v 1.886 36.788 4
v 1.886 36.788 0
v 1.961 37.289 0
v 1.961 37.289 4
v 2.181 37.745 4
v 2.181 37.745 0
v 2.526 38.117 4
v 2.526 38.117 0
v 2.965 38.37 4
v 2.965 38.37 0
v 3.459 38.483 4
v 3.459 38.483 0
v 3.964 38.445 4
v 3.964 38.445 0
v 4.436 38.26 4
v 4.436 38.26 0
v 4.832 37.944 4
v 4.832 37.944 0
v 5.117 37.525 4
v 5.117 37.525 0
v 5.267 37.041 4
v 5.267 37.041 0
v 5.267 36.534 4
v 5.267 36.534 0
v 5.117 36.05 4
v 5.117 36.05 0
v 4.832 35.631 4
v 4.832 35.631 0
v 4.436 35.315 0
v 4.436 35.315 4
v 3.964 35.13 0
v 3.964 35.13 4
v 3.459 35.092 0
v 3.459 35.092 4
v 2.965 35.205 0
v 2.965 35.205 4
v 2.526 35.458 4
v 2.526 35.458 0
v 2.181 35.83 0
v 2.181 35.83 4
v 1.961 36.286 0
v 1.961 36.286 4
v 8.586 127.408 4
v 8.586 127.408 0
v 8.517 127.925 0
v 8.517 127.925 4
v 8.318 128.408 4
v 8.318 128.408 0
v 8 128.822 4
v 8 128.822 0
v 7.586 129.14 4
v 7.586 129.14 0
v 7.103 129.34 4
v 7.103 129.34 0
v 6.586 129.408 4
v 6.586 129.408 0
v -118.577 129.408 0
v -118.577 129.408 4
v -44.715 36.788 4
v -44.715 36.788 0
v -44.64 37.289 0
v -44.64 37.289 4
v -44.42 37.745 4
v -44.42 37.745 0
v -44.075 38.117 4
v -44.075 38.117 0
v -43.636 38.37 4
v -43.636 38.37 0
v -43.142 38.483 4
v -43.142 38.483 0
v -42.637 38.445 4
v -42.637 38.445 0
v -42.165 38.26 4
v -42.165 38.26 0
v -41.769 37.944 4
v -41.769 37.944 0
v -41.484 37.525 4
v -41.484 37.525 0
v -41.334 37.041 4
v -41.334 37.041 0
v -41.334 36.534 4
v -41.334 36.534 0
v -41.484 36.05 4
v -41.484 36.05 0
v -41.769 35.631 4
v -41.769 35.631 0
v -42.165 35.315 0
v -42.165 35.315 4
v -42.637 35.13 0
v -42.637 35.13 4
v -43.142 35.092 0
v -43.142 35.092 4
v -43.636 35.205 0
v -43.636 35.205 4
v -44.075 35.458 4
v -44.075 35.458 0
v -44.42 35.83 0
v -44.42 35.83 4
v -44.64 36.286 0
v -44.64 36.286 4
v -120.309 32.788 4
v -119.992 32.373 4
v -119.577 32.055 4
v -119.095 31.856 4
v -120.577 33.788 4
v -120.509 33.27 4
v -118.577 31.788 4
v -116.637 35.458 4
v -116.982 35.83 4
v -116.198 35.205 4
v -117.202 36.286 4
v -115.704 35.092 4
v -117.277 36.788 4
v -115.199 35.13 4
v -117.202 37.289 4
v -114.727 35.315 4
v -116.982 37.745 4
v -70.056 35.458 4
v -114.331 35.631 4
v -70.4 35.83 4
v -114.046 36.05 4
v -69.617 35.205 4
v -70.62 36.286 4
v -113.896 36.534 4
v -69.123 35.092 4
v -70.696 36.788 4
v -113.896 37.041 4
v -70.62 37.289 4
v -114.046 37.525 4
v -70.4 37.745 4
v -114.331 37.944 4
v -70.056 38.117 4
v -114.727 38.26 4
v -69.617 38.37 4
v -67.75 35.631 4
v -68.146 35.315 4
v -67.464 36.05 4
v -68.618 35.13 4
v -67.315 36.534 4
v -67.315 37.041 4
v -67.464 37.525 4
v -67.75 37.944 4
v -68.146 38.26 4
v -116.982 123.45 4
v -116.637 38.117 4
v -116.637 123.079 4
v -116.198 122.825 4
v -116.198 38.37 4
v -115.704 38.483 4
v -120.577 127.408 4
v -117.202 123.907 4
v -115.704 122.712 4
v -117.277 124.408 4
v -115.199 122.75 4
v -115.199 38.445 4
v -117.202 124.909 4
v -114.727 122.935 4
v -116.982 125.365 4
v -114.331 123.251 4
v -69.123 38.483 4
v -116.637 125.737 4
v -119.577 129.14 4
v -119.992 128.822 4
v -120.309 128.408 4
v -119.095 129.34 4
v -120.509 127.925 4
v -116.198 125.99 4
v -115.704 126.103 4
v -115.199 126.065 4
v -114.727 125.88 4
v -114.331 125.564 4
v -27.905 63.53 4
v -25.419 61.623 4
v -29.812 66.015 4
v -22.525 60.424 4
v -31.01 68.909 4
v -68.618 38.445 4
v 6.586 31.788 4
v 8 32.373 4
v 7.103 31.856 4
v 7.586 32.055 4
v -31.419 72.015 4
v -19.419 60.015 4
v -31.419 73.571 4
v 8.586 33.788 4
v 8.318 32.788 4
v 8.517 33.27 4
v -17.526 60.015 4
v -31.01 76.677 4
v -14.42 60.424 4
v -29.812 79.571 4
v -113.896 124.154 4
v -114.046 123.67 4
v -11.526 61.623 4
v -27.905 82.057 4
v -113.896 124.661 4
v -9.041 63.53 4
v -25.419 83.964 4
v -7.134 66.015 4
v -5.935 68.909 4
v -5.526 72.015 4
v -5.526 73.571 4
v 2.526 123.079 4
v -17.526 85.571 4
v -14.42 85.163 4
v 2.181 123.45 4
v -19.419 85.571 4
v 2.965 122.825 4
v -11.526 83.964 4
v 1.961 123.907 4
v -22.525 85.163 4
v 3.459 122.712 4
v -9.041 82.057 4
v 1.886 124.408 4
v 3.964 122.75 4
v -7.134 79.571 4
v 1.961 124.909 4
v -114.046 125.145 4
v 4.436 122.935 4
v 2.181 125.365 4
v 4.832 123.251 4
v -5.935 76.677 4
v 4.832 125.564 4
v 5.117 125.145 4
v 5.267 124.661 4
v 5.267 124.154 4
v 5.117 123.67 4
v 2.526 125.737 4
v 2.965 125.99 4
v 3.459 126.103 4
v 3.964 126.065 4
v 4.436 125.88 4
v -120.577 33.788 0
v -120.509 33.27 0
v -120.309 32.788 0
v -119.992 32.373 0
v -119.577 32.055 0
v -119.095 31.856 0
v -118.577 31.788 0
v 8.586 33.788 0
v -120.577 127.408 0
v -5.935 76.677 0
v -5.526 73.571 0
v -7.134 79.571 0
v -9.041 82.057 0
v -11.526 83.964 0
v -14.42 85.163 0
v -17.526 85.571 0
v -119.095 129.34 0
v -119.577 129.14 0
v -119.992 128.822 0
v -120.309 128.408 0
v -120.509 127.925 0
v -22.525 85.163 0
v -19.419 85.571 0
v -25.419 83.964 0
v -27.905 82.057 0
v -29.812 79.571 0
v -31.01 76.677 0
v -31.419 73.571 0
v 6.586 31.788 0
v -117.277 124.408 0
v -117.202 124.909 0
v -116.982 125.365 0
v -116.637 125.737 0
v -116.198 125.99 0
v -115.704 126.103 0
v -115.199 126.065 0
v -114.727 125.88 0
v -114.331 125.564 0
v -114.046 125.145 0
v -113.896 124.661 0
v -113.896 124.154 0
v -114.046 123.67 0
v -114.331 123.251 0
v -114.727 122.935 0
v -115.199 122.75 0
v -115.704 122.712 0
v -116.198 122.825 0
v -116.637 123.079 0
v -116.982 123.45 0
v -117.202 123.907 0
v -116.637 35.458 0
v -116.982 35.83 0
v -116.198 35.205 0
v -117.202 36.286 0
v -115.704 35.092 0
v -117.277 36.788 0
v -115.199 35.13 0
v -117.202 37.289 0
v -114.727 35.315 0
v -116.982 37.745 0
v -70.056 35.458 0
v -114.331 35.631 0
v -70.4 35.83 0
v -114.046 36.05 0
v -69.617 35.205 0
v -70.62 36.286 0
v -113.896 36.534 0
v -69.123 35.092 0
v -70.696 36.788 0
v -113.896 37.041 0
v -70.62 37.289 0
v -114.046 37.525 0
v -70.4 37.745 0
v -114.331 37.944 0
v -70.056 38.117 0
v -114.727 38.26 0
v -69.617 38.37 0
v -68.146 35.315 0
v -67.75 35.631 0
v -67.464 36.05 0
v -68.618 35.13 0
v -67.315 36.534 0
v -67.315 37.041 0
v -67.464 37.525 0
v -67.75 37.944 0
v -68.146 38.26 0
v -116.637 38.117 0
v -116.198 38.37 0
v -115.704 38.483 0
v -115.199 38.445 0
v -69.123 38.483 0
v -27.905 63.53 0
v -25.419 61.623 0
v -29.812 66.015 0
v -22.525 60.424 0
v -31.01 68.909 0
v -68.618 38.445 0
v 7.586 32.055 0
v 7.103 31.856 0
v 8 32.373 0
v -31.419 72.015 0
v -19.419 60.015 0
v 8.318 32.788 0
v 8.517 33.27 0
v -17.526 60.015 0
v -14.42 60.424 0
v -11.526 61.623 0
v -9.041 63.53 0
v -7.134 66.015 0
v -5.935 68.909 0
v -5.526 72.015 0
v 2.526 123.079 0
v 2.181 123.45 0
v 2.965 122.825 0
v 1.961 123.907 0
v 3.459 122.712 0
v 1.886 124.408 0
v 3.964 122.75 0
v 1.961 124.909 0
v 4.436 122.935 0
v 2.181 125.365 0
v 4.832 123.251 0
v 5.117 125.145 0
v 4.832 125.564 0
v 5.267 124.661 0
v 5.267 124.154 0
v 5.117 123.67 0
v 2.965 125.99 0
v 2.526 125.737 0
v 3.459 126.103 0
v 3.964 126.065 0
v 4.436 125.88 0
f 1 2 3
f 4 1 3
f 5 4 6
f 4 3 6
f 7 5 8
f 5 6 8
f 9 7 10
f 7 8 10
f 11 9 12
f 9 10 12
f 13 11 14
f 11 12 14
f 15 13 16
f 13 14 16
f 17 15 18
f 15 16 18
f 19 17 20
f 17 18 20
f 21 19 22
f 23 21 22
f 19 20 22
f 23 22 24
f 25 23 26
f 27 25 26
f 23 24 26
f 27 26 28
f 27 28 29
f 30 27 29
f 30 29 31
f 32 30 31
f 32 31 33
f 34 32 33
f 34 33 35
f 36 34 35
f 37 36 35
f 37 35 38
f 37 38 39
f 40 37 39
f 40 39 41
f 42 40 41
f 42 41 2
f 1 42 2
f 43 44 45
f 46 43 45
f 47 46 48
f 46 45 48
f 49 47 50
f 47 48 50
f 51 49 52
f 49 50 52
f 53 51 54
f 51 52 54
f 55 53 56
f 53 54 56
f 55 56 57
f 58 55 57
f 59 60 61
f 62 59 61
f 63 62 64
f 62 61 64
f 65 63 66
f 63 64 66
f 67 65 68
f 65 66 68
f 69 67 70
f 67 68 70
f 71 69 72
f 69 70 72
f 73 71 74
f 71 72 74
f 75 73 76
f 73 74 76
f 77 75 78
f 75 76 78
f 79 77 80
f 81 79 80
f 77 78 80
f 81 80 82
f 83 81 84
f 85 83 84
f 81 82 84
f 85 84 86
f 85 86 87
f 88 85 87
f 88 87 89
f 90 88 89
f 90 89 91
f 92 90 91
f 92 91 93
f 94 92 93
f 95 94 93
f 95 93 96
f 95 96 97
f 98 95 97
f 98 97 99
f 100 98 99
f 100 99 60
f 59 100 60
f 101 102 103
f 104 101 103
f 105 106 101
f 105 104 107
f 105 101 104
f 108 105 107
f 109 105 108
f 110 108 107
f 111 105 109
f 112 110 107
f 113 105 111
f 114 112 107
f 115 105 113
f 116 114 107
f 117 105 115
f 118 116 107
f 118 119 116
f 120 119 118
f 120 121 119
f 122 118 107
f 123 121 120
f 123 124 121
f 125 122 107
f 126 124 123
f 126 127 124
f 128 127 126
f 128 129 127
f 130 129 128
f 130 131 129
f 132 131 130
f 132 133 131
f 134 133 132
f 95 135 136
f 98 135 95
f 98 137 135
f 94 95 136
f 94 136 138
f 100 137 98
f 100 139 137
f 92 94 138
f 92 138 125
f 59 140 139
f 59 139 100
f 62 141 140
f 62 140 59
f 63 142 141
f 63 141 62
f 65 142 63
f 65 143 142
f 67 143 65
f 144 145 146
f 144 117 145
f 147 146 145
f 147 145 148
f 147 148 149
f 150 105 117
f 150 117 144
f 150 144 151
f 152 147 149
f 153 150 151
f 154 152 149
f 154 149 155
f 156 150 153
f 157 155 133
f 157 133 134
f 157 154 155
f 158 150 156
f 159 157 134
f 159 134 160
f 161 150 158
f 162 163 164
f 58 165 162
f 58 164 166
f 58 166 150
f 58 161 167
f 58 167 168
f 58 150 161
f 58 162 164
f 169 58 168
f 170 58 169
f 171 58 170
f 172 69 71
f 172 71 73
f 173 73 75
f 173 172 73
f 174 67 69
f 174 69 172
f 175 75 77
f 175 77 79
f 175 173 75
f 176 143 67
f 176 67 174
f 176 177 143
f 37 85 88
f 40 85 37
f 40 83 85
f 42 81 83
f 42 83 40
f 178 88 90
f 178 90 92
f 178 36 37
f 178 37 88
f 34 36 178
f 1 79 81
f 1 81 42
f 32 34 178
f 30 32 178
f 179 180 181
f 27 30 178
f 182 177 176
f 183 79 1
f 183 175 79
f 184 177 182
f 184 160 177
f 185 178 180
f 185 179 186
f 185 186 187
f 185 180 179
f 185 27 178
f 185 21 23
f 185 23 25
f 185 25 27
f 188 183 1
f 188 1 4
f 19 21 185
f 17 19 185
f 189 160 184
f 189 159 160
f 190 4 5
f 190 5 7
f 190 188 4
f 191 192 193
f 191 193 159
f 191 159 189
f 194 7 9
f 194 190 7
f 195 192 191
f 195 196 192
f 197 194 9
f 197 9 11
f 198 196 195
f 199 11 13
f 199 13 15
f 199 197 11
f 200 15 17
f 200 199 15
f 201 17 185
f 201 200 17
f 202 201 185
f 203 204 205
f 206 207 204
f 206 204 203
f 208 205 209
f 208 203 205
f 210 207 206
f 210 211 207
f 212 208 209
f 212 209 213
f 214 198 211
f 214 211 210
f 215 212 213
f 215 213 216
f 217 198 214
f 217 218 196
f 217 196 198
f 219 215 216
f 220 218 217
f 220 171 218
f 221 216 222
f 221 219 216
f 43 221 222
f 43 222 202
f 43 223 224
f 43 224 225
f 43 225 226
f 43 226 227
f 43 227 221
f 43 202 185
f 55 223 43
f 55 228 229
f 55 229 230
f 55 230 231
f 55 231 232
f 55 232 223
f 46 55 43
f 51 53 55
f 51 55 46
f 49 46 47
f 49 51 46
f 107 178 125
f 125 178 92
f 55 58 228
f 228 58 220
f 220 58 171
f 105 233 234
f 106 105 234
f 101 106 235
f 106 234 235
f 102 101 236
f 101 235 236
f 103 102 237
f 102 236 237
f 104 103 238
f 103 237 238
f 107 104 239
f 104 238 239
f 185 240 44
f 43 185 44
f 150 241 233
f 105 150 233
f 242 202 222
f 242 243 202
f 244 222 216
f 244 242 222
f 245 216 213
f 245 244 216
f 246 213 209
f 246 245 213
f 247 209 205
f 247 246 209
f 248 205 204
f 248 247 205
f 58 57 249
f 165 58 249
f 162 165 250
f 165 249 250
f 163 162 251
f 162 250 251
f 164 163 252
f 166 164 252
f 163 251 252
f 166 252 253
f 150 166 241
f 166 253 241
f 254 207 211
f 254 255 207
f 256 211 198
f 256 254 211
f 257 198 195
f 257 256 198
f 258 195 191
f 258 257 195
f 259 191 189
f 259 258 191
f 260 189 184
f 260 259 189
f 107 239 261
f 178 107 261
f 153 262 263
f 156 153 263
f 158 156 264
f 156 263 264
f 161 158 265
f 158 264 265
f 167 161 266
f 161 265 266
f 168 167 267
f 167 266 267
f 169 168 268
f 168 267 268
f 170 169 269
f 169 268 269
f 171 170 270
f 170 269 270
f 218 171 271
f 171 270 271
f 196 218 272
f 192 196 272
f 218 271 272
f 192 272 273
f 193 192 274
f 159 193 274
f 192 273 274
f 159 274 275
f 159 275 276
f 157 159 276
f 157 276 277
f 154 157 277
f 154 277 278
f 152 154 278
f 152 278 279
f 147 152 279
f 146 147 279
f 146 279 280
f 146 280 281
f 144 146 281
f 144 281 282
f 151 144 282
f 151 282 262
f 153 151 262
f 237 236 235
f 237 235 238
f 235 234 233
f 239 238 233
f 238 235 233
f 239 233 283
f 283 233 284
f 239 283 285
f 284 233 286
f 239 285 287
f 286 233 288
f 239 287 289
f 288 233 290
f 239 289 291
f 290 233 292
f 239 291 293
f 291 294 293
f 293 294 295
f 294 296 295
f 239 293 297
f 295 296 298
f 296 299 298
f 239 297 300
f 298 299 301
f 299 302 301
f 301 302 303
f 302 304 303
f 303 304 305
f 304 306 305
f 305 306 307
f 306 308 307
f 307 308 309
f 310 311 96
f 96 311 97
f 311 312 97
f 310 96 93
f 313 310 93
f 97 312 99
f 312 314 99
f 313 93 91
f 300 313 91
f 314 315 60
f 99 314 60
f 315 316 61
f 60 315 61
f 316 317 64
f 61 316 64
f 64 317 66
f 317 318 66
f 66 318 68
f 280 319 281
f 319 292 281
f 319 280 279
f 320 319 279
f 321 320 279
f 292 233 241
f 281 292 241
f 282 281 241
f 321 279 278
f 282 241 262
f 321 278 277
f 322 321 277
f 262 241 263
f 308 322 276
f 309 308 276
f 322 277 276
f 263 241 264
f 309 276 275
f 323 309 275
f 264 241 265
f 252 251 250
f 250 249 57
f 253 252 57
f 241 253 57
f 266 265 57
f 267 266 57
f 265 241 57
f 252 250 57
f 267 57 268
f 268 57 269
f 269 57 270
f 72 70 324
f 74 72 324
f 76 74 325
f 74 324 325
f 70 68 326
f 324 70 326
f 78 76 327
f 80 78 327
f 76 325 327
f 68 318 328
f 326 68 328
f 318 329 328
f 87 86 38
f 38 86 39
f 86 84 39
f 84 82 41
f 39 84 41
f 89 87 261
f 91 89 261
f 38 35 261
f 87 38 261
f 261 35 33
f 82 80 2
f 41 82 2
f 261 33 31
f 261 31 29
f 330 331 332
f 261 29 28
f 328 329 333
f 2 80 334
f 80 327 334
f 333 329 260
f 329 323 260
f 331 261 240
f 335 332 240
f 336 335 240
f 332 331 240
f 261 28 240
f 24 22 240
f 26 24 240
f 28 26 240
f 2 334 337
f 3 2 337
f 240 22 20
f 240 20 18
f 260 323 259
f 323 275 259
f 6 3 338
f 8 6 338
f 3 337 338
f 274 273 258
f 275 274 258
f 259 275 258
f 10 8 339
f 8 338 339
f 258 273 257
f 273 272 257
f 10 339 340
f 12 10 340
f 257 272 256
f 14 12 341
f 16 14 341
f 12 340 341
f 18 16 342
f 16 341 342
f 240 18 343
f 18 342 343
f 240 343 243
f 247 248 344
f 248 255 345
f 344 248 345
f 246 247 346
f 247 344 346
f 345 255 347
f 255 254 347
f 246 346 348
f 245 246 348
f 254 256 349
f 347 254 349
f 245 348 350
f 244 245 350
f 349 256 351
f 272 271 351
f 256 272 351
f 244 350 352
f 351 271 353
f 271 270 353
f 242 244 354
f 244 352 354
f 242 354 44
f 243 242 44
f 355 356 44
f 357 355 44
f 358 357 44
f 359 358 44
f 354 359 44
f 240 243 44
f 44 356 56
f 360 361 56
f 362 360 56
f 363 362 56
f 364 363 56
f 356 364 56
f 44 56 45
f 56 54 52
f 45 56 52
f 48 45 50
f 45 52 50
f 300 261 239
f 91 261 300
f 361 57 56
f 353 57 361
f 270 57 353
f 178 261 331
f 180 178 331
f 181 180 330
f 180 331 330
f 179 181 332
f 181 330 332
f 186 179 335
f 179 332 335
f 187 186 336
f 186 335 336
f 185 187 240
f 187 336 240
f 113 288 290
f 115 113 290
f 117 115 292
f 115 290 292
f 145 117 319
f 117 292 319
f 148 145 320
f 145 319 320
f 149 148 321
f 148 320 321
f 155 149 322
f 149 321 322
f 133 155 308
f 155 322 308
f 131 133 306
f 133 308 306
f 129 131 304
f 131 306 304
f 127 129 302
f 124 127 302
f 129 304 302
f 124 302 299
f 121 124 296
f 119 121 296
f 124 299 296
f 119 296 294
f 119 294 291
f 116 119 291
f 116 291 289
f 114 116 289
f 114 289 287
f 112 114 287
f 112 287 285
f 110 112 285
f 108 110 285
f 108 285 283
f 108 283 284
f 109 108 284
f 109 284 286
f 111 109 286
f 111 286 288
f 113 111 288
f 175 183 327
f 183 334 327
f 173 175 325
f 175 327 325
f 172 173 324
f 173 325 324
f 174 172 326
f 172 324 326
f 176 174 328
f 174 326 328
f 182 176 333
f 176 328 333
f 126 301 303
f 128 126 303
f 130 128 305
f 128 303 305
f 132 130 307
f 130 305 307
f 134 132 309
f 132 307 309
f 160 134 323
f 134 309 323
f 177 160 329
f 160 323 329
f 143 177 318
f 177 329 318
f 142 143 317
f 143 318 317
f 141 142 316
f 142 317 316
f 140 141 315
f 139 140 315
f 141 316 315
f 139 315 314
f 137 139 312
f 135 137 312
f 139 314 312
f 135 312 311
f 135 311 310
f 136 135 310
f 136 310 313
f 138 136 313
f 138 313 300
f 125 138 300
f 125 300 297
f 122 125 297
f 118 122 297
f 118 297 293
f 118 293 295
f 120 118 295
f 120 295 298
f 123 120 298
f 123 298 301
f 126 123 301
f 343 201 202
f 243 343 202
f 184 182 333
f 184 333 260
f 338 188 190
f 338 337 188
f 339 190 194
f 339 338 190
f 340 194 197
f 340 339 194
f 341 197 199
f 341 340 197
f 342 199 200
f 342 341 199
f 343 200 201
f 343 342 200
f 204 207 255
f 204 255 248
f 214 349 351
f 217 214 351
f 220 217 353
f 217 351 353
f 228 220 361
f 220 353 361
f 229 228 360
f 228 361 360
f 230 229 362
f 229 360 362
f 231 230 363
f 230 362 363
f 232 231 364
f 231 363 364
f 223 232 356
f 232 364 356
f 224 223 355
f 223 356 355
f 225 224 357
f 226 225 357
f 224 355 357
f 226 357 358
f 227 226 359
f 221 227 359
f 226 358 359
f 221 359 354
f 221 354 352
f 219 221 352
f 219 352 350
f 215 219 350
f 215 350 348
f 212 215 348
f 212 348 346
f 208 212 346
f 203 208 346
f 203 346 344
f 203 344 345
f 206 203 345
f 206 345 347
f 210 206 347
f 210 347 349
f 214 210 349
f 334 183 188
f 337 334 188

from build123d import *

# Parameters (mm, degrees)
BOSS_EXTRUDE1_DEPTH  = 4
M3_CLEARANCE_HOLE1_D = 3.4
SKETCH4_W            = 25.893128439
SKETCH4_H            = 25.556513708
CUT_EXTRUDE1_DEPTH   = 8
FILLET1_R            = 12


with BuildPart() as part:
    # Sketch1 → Boss-Extrude1 (new body)
    with BuildSketch(Plane.XY):
        with BuildLine():
            Line((-118.577385132, 31.787530767), (6.585636131, 31.787530767))
            ThreePointArc((6.585636131, 31.787530767), (7.999849693, 32.373317205), (8.585636131, 33.787530767))
            Line((8.585636131, 33.787530767), (8.585636131, 127.40770823))
            ThreePointArc((8.585636131, 127.40770823), (7.999849693, 128.821921793), (6.585636131, 129.40770823))
            Line((6.585636131, 129.40770823), (-118.577385132, 129.40770823))
            ThreePointArc((-118.577385132, 129.40770823), (-119.991598694, 128.821921793), (-120.577385132, 127.40770823))
            Line((-120.577385132, 127.40770823), (-120.577385132, 33.787530767))
            ThreePointArc((-120.577385132, 33.787530767), (-119.991598694, 32.373317205), (-118.577385132, 31.787530767))
        make_face()
    extrude(amount=BOSS_EXTRUDE1_DEPTH)

    # M3 Clearance Hole1 (through all)
    with Locations(Plane.XY.offset(4)):
        with Locations((-115.577385132, 124.40770823), (3.585636131, 124.40770823), (-115.577385132, 36.787530767), (-68.995874501, 36.787530767), (-43.015256757, 36.787530767), (3.585636131, 36.787530767)):
            Hole(M3_CLEARANCE_HOLE1_D / 2)

    # Sketch4 → Cut-Extrude1 (cut)
    with BuildSketch(Plane.XY.offset(4)):
        with Locations((-18.472781595, 72.793183927)):
            Rectangle(SKETCH4_W, SKETCH4_H)
    extrude(amount=-CUT_EXTRUDE1_DEPTH, mode=Mode.SUBTRACT)

    # Fillet1
    fillet1_edges = [part.edges().sort_by_distance(p)[0] for p in [
        (-5.526217375, 85.571440781, 2),
        (-5.526217375, 60.014927073, 2),
        (-31.419345814, 60.014927073, 2),
        (-31.419345814, 85.571440781, 2),
    ]]
    fillet(fillet1_edges, radius=FILLET1_R)


solid = part.part
